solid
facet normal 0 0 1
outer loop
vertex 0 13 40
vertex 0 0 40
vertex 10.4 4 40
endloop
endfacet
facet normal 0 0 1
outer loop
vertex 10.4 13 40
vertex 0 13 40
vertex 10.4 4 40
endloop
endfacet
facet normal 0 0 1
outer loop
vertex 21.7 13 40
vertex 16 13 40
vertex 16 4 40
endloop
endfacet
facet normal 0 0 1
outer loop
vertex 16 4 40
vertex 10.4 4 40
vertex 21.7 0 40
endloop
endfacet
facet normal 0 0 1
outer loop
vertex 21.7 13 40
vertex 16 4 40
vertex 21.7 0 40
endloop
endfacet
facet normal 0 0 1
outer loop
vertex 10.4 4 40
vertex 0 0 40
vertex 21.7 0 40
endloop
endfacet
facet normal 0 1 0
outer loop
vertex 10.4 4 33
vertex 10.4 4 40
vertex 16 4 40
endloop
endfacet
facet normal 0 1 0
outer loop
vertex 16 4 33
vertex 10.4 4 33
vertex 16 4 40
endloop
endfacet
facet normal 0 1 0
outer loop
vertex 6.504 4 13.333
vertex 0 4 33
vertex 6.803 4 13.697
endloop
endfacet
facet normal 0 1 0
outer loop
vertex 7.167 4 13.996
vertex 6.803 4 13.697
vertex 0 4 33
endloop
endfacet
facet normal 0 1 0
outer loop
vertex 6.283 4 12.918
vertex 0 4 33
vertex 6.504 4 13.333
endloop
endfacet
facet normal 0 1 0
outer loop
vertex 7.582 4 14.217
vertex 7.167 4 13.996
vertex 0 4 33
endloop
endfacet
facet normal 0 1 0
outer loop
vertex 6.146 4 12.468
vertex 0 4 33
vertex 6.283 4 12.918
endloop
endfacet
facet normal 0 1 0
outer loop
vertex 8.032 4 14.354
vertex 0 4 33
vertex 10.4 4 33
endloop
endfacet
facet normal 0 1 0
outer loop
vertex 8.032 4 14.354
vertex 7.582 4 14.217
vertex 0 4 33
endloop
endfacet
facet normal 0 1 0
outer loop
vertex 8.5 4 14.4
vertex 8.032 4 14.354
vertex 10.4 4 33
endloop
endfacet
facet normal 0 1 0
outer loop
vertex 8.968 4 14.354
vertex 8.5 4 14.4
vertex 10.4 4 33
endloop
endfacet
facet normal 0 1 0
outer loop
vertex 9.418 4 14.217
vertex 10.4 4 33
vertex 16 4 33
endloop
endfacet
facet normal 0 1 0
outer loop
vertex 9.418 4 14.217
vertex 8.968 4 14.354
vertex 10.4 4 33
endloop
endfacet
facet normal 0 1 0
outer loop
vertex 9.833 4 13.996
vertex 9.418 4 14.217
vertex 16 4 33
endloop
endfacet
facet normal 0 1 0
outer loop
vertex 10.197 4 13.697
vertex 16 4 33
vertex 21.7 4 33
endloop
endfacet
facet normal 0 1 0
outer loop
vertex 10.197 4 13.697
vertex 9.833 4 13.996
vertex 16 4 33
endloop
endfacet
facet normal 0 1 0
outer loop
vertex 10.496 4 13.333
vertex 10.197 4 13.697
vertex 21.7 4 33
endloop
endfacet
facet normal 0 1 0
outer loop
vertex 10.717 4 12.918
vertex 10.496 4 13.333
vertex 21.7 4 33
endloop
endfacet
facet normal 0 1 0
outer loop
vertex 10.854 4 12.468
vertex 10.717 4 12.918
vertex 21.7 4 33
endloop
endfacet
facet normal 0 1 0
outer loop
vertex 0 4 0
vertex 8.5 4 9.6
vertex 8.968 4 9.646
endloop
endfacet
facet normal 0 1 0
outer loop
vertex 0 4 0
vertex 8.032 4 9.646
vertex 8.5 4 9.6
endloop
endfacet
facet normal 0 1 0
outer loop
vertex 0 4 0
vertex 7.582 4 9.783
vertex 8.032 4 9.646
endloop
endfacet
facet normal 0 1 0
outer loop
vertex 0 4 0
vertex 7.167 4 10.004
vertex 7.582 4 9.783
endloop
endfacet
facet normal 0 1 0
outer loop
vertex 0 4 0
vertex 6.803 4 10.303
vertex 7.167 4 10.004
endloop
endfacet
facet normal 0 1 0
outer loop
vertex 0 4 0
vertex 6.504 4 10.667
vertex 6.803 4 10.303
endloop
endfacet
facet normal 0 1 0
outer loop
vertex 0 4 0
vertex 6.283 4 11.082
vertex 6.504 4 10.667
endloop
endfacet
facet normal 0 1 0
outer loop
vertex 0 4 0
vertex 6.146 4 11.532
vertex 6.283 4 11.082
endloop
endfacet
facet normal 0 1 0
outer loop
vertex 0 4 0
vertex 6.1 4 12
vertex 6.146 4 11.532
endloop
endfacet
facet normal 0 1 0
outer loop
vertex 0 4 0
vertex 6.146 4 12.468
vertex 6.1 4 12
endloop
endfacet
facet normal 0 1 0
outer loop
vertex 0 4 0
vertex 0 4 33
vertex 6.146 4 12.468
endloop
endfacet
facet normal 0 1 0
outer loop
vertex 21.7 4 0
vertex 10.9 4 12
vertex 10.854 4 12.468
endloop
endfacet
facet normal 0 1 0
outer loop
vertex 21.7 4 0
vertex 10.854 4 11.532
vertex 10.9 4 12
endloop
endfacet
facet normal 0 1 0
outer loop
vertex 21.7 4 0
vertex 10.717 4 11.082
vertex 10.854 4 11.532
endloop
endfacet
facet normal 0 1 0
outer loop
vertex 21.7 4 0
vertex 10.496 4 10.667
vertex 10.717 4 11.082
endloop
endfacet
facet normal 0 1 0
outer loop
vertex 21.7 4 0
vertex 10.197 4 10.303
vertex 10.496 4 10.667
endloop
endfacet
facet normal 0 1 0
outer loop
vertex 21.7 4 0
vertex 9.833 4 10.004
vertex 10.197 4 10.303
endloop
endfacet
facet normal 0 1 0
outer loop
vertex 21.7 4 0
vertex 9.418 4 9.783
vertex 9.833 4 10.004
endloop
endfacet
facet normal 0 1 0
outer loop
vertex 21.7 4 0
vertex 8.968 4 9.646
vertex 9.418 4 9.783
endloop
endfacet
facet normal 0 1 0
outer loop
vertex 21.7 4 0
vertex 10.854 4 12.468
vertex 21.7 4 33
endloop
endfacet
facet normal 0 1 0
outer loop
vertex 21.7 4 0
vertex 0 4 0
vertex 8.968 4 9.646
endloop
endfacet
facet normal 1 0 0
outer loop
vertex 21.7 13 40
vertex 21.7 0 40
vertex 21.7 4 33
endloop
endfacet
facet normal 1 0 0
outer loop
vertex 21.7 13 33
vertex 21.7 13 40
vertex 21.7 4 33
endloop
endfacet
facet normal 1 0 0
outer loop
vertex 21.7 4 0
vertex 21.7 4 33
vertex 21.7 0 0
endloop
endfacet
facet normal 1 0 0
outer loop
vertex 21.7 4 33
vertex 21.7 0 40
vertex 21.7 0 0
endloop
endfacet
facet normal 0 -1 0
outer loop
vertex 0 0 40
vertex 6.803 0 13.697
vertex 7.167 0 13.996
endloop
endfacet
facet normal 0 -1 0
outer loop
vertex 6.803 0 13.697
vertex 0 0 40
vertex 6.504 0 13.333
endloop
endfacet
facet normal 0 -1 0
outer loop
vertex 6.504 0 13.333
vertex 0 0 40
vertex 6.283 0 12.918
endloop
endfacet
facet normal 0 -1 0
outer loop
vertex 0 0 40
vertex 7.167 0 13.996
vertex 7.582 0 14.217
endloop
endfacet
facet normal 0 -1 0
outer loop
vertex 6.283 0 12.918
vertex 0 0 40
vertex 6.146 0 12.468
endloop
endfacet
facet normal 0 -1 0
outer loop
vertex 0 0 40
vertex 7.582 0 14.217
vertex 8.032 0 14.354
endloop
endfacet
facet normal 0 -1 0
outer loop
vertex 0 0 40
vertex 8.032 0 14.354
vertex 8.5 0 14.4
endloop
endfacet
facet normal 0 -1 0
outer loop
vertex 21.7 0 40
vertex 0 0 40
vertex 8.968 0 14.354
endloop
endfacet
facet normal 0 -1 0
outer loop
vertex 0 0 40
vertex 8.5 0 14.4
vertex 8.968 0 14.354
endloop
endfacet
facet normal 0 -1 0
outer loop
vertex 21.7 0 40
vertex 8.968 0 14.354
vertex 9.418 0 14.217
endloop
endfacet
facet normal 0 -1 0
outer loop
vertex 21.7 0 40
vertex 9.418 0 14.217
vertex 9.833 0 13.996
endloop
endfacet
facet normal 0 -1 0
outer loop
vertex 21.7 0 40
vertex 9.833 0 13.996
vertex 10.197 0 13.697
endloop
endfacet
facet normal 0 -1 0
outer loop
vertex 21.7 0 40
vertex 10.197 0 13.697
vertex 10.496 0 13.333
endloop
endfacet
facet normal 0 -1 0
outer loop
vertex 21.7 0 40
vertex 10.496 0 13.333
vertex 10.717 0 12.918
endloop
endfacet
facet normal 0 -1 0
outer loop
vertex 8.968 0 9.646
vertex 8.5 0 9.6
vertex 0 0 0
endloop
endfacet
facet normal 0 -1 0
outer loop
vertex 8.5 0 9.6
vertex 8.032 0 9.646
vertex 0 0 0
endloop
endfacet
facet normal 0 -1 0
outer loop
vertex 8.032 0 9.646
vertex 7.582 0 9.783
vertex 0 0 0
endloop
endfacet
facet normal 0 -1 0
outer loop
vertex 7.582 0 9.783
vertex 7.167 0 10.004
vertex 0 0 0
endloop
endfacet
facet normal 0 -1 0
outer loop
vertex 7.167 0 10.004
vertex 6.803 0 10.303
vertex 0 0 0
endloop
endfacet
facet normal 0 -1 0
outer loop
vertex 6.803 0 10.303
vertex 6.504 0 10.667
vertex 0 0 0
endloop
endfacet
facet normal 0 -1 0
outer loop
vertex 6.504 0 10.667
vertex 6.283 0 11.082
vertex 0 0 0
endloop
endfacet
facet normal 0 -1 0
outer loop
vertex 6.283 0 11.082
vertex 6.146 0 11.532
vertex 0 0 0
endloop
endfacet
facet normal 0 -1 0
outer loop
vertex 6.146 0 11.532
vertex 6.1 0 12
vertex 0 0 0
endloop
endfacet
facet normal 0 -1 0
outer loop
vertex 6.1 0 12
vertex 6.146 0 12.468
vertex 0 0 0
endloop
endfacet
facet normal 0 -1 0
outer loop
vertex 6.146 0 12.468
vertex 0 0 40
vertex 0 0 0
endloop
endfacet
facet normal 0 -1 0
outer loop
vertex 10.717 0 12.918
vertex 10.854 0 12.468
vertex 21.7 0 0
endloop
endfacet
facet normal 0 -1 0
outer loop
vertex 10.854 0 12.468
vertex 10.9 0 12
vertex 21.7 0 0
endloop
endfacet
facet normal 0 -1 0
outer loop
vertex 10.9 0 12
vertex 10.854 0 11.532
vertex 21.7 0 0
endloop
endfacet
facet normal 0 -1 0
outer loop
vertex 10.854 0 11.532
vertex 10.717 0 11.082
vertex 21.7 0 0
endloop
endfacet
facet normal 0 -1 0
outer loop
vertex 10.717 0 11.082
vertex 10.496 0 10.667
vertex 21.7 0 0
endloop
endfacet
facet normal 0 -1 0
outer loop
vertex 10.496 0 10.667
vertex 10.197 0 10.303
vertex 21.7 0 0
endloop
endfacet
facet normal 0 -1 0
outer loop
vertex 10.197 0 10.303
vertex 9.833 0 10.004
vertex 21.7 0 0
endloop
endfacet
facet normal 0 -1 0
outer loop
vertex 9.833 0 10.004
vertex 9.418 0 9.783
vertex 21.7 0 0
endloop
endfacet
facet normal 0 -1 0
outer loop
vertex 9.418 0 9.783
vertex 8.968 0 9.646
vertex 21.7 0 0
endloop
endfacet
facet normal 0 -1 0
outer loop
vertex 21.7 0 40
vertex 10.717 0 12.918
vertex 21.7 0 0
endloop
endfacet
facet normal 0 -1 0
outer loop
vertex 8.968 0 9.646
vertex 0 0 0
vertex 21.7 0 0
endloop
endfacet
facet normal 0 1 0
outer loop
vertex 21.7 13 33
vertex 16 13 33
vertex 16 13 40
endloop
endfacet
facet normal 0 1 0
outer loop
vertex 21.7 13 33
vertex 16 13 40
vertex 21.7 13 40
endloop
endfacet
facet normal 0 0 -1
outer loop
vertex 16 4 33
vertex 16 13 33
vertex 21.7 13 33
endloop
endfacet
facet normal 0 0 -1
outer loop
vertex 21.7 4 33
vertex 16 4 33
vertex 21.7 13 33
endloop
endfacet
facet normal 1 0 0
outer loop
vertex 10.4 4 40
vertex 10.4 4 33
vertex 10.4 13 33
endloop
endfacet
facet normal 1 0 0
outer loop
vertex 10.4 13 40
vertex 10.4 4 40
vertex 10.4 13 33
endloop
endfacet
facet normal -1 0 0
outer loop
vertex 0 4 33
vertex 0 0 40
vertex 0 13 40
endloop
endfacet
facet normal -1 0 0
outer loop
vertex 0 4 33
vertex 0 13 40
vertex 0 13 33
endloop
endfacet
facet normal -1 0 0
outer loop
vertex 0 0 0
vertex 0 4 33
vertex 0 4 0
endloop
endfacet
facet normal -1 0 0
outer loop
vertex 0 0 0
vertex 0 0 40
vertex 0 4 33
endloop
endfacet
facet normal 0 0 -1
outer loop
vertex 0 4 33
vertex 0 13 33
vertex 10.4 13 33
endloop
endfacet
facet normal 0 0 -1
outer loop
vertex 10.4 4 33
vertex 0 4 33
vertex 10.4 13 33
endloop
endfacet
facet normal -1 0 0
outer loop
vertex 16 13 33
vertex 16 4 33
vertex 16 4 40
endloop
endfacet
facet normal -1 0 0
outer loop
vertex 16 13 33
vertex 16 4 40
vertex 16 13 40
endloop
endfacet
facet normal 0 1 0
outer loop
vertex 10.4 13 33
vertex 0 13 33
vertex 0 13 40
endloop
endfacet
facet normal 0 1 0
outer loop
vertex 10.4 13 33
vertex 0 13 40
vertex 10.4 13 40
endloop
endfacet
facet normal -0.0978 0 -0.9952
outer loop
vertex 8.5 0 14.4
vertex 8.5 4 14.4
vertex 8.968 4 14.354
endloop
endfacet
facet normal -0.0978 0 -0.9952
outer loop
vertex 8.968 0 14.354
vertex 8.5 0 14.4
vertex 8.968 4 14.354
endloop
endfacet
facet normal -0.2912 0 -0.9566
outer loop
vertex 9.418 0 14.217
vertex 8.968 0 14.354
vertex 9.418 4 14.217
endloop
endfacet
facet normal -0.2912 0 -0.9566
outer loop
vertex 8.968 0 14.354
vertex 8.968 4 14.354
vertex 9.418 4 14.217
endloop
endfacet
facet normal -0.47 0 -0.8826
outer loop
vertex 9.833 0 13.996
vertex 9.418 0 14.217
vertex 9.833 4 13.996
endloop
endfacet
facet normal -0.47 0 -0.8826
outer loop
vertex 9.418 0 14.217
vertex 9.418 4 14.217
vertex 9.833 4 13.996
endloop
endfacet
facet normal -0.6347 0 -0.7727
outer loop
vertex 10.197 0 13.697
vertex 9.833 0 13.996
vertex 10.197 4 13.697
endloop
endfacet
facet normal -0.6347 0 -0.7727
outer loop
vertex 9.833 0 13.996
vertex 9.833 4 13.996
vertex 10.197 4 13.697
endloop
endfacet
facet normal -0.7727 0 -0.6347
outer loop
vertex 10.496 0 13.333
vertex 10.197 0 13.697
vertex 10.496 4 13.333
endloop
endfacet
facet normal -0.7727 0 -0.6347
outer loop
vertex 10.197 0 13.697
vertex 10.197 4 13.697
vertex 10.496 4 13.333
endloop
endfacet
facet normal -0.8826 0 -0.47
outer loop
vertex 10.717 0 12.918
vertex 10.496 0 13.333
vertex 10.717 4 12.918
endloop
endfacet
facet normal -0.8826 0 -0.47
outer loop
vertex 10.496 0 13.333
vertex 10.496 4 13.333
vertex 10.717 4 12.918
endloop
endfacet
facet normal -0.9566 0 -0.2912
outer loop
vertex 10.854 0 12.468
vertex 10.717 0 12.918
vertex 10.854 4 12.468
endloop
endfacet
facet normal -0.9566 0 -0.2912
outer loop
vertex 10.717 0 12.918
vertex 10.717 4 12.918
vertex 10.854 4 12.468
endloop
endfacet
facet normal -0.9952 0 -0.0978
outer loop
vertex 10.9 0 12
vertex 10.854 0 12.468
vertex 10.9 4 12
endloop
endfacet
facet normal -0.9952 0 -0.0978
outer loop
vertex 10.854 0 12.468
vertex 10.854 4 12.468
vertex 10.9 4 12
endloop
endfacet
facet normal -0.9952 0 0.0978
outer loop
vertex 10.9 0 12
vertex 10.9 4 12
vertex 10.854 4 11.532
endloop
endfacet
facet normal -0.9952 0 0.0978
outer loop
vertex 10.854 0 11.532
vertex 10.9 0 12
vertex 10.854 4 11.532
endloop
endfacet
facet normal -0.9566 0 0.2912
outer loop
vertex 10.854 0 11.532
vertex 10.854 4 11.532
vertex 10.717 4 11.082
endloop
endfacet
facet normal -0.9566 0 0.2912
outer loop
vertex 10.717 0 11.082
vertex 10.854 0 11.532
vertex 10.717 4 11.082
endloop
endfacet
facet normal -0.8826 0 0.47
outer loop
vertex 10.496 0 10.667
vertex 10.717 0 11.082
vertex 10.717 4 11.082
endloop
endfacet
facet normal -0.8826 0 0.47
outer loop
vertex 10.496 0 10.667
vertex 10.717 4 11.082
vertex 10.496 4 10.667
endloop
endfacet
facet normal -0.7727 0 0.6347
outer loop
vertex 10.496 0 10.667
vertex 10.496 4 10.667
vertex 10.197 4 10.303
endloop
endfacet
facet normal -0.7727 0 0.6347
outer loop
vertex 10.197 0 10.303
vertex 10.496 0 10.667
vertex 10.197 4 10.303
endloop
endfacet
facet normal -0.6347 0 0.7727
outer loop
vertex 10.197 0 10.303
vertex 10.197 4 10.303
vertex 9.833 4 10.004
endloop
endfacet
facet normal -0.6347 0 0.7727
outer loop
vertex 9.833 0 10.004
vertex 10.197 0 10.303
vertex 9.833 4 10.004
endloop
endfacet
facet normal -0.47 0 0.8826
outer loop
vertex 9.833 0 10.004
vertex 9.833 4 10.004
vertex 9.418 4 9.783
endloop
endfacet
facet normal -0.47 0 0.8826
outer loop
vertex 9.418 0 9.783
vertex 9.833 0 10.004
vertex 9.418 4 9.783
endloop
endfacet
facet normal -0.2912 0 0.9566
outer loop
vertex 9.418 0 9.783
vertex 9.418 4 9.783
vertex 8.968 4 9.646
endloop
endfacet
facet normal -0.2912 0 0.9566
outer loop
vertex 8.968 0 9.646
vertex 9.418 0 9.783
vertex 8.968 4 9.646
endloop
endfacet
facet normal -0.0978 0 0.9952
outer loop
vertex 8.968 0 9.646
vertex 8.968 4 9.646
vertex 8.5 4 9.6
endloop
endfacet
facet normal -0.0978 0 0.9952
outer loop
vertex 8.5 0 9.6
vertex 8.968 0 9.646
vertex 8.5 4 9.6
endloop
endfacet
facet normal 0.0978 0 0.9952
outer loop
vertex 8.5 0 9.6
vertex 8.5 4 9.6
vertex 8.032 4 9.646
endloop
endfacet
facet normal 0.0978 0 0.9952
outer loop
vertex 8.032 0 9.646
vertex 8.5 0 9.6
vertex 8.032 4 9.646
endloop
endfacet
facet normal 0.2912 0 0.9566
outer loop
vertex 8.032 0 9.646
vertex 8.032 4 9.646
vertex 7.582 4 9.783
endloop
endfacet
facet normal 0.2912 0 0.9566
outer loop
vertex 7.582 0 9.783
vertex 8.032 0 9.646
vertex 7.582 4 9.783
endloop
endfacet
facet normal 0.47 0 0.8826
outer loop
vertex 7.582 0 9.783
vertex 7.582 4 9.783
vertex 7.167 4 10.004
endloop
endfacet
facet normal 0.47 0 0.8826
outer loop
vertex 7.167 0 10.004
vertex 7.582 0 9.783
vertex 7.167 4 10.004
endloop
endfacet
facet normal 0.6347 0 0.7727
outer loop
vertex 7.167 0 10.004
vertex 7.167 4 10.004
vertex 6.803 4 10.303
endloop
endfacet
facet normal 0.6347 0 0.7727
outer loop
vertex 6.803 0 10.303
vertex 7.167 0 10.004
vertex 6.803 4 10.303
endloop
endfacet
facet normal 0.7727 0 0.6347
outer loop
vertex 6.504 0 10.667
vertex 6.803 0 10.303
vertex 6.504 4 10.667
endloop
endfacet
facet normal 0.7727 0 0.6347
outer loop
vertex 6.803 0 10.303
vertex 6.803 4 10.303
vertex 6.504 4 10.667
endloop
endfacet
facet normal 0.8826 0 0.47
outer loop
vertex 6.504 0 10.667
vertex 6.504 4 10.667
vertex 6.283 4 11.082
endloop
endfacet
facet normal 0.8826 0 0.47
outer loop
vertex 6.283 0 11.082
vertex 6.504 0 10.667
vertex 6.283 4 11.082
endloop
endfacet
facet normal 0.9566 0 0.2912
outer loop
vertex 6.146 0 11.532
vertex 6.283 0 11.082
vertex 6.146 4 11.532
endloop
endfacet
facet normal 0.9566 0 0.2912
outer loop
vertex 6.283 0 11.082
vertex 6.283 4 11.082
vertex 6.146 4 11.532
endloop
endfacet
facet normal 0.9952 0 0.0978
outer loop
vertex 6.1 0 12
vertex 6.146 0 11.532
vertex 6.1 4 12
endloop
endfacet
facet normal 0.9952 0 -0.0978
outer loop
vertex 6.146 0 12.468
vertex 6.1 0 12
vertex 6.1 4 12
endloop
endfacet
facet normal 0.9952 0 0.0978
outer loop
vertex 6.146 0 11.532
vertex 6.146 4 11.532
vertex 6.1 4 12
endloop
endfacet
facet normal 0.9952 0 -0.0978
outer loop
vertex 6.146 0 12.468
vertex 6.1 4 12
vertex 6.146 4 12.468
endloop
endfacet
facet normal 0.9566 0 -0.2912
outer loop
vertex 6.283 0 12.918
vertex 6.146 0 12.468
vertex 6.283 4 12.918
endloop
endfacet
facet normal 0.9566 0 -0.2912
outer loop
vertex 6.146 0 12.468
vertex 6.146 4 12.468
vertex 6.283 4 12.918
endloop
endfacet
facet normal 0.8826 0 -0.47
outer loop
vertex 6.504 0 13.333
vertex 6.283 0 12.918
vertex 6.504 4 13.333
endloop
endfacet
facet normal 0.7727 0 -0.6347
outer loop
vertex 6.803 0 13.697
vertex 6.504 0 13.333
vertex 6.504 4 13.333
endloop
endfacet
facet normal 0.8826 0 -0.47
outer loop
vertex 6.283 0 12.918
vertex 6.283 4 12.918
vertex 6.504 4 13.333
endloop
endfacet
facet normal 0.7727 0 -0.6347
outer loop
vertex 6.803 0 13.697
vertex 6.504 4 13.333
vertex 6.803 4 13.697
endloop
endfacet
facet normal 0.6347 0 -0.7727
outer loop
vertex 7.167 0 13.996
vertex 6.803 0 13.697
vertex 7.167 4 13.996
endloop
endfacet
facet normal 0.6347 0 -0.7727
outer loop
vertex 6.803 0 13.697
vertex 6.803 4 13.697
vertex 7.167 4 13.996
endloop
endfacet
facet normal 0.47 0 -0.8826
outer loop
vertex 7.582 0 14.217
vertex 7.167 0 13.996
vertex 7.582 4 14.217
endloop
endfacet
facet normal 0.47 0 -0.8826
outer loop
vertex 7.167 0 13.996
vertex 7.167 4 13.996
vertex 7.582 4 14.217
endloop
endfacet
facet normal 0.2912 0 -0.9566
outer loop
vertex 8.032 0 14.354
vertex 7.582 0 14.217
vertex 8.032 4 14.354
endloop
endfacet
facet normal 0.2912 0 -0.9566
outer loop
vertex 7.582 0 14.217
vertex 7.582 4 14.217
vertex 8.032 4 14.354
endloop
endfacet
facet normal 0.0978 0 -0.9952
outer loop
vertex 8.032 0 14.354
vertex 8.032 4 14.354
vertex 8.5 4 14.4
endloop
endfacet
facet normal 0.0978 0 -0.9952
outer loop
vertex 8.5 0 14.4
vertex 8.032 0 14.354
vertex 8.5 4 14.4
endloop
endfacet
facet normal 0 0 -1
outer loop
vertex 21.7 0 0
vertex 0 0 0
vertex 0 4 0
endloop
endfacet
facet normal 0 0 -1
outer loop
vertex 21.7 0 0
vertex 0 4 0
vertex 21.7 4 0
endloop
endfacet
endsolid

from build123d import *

# Parameters (mm, degrees)
SKETCH1_W           = 21.7
SKETCH1_H           = 40
BOSS_EXTRUDE1_DEPTH = 13
SKETCH3_W           = 21.7
SKETCH3_H           = 33
CUT_EXTRUDE1_DEPTH  = 9
SKETCH5_W           = 5.6
SKETCH5_H           = 9
CUT_EXTRUDE2_DEPTH  = 42.57992304
SKETCH6_R           = 2.4
CUT_EXTRUDE4_DEPTH  = 47.388468395


with BuildPart() as part:
    # Sketch1 → Boss-Extrude1 (new body)
    with BuildSketch(Plane(origin=(0, 0, 0), x_dir=(1, 0, 0), z_dir=(0, 1, 0))):
        with Locations((10.85, -20)):
            Rectangle(SKETCH1_W, SKETCH1_H)
    extrude(amount=BOSS_EXTRUDE1_DEPTH)

    # Sketch3 → Cut-Extrude1 (cut)
    with BuildSketch(Plane(origin=(0, 13, 0), x_dir=(1, 0, 0), z_dir=(0, 1, 0))):
        with Locations((10.85, -16.5)):
            Rectangle(SKETCH3_W, SKETCH3_H)
    extrude(amount=-CUT_EXTRUDE1_DEPTH, mode=Mode.SUBTRACT)

    # Sketch5 → Cut-Extrude2 (cut, through all)
    with BuildSketch(Plane(origin=(0, 0, 33), x_dir=(-1, 0, 0), z_dir=(0, 0, -1))):
        with Locations((-13.2, 8.5)):
            Rectangle(SKETCH5_W, SKETCH5_H)
    extrude(amount=-CUT_EXTRUDE2_DEPTH, mode=Mode.SUBTRACT)

    # Sketch6 → Cut-Extrude4 (cut, through all)
    with BuildSketch(Plane(origin=(0, 4, 0), x_dir=(1, 0, 0), z_dir=(0, 1, 0))):
        with Locations(Location((8.5, -12, 0), (0, 0, 270))):
            Circle(SKETCH6_R)
    extrude(amount=-CUT_EXTRUDE4_DEPTH, mode=Mode.SUBTRACT)


solid = part.part
